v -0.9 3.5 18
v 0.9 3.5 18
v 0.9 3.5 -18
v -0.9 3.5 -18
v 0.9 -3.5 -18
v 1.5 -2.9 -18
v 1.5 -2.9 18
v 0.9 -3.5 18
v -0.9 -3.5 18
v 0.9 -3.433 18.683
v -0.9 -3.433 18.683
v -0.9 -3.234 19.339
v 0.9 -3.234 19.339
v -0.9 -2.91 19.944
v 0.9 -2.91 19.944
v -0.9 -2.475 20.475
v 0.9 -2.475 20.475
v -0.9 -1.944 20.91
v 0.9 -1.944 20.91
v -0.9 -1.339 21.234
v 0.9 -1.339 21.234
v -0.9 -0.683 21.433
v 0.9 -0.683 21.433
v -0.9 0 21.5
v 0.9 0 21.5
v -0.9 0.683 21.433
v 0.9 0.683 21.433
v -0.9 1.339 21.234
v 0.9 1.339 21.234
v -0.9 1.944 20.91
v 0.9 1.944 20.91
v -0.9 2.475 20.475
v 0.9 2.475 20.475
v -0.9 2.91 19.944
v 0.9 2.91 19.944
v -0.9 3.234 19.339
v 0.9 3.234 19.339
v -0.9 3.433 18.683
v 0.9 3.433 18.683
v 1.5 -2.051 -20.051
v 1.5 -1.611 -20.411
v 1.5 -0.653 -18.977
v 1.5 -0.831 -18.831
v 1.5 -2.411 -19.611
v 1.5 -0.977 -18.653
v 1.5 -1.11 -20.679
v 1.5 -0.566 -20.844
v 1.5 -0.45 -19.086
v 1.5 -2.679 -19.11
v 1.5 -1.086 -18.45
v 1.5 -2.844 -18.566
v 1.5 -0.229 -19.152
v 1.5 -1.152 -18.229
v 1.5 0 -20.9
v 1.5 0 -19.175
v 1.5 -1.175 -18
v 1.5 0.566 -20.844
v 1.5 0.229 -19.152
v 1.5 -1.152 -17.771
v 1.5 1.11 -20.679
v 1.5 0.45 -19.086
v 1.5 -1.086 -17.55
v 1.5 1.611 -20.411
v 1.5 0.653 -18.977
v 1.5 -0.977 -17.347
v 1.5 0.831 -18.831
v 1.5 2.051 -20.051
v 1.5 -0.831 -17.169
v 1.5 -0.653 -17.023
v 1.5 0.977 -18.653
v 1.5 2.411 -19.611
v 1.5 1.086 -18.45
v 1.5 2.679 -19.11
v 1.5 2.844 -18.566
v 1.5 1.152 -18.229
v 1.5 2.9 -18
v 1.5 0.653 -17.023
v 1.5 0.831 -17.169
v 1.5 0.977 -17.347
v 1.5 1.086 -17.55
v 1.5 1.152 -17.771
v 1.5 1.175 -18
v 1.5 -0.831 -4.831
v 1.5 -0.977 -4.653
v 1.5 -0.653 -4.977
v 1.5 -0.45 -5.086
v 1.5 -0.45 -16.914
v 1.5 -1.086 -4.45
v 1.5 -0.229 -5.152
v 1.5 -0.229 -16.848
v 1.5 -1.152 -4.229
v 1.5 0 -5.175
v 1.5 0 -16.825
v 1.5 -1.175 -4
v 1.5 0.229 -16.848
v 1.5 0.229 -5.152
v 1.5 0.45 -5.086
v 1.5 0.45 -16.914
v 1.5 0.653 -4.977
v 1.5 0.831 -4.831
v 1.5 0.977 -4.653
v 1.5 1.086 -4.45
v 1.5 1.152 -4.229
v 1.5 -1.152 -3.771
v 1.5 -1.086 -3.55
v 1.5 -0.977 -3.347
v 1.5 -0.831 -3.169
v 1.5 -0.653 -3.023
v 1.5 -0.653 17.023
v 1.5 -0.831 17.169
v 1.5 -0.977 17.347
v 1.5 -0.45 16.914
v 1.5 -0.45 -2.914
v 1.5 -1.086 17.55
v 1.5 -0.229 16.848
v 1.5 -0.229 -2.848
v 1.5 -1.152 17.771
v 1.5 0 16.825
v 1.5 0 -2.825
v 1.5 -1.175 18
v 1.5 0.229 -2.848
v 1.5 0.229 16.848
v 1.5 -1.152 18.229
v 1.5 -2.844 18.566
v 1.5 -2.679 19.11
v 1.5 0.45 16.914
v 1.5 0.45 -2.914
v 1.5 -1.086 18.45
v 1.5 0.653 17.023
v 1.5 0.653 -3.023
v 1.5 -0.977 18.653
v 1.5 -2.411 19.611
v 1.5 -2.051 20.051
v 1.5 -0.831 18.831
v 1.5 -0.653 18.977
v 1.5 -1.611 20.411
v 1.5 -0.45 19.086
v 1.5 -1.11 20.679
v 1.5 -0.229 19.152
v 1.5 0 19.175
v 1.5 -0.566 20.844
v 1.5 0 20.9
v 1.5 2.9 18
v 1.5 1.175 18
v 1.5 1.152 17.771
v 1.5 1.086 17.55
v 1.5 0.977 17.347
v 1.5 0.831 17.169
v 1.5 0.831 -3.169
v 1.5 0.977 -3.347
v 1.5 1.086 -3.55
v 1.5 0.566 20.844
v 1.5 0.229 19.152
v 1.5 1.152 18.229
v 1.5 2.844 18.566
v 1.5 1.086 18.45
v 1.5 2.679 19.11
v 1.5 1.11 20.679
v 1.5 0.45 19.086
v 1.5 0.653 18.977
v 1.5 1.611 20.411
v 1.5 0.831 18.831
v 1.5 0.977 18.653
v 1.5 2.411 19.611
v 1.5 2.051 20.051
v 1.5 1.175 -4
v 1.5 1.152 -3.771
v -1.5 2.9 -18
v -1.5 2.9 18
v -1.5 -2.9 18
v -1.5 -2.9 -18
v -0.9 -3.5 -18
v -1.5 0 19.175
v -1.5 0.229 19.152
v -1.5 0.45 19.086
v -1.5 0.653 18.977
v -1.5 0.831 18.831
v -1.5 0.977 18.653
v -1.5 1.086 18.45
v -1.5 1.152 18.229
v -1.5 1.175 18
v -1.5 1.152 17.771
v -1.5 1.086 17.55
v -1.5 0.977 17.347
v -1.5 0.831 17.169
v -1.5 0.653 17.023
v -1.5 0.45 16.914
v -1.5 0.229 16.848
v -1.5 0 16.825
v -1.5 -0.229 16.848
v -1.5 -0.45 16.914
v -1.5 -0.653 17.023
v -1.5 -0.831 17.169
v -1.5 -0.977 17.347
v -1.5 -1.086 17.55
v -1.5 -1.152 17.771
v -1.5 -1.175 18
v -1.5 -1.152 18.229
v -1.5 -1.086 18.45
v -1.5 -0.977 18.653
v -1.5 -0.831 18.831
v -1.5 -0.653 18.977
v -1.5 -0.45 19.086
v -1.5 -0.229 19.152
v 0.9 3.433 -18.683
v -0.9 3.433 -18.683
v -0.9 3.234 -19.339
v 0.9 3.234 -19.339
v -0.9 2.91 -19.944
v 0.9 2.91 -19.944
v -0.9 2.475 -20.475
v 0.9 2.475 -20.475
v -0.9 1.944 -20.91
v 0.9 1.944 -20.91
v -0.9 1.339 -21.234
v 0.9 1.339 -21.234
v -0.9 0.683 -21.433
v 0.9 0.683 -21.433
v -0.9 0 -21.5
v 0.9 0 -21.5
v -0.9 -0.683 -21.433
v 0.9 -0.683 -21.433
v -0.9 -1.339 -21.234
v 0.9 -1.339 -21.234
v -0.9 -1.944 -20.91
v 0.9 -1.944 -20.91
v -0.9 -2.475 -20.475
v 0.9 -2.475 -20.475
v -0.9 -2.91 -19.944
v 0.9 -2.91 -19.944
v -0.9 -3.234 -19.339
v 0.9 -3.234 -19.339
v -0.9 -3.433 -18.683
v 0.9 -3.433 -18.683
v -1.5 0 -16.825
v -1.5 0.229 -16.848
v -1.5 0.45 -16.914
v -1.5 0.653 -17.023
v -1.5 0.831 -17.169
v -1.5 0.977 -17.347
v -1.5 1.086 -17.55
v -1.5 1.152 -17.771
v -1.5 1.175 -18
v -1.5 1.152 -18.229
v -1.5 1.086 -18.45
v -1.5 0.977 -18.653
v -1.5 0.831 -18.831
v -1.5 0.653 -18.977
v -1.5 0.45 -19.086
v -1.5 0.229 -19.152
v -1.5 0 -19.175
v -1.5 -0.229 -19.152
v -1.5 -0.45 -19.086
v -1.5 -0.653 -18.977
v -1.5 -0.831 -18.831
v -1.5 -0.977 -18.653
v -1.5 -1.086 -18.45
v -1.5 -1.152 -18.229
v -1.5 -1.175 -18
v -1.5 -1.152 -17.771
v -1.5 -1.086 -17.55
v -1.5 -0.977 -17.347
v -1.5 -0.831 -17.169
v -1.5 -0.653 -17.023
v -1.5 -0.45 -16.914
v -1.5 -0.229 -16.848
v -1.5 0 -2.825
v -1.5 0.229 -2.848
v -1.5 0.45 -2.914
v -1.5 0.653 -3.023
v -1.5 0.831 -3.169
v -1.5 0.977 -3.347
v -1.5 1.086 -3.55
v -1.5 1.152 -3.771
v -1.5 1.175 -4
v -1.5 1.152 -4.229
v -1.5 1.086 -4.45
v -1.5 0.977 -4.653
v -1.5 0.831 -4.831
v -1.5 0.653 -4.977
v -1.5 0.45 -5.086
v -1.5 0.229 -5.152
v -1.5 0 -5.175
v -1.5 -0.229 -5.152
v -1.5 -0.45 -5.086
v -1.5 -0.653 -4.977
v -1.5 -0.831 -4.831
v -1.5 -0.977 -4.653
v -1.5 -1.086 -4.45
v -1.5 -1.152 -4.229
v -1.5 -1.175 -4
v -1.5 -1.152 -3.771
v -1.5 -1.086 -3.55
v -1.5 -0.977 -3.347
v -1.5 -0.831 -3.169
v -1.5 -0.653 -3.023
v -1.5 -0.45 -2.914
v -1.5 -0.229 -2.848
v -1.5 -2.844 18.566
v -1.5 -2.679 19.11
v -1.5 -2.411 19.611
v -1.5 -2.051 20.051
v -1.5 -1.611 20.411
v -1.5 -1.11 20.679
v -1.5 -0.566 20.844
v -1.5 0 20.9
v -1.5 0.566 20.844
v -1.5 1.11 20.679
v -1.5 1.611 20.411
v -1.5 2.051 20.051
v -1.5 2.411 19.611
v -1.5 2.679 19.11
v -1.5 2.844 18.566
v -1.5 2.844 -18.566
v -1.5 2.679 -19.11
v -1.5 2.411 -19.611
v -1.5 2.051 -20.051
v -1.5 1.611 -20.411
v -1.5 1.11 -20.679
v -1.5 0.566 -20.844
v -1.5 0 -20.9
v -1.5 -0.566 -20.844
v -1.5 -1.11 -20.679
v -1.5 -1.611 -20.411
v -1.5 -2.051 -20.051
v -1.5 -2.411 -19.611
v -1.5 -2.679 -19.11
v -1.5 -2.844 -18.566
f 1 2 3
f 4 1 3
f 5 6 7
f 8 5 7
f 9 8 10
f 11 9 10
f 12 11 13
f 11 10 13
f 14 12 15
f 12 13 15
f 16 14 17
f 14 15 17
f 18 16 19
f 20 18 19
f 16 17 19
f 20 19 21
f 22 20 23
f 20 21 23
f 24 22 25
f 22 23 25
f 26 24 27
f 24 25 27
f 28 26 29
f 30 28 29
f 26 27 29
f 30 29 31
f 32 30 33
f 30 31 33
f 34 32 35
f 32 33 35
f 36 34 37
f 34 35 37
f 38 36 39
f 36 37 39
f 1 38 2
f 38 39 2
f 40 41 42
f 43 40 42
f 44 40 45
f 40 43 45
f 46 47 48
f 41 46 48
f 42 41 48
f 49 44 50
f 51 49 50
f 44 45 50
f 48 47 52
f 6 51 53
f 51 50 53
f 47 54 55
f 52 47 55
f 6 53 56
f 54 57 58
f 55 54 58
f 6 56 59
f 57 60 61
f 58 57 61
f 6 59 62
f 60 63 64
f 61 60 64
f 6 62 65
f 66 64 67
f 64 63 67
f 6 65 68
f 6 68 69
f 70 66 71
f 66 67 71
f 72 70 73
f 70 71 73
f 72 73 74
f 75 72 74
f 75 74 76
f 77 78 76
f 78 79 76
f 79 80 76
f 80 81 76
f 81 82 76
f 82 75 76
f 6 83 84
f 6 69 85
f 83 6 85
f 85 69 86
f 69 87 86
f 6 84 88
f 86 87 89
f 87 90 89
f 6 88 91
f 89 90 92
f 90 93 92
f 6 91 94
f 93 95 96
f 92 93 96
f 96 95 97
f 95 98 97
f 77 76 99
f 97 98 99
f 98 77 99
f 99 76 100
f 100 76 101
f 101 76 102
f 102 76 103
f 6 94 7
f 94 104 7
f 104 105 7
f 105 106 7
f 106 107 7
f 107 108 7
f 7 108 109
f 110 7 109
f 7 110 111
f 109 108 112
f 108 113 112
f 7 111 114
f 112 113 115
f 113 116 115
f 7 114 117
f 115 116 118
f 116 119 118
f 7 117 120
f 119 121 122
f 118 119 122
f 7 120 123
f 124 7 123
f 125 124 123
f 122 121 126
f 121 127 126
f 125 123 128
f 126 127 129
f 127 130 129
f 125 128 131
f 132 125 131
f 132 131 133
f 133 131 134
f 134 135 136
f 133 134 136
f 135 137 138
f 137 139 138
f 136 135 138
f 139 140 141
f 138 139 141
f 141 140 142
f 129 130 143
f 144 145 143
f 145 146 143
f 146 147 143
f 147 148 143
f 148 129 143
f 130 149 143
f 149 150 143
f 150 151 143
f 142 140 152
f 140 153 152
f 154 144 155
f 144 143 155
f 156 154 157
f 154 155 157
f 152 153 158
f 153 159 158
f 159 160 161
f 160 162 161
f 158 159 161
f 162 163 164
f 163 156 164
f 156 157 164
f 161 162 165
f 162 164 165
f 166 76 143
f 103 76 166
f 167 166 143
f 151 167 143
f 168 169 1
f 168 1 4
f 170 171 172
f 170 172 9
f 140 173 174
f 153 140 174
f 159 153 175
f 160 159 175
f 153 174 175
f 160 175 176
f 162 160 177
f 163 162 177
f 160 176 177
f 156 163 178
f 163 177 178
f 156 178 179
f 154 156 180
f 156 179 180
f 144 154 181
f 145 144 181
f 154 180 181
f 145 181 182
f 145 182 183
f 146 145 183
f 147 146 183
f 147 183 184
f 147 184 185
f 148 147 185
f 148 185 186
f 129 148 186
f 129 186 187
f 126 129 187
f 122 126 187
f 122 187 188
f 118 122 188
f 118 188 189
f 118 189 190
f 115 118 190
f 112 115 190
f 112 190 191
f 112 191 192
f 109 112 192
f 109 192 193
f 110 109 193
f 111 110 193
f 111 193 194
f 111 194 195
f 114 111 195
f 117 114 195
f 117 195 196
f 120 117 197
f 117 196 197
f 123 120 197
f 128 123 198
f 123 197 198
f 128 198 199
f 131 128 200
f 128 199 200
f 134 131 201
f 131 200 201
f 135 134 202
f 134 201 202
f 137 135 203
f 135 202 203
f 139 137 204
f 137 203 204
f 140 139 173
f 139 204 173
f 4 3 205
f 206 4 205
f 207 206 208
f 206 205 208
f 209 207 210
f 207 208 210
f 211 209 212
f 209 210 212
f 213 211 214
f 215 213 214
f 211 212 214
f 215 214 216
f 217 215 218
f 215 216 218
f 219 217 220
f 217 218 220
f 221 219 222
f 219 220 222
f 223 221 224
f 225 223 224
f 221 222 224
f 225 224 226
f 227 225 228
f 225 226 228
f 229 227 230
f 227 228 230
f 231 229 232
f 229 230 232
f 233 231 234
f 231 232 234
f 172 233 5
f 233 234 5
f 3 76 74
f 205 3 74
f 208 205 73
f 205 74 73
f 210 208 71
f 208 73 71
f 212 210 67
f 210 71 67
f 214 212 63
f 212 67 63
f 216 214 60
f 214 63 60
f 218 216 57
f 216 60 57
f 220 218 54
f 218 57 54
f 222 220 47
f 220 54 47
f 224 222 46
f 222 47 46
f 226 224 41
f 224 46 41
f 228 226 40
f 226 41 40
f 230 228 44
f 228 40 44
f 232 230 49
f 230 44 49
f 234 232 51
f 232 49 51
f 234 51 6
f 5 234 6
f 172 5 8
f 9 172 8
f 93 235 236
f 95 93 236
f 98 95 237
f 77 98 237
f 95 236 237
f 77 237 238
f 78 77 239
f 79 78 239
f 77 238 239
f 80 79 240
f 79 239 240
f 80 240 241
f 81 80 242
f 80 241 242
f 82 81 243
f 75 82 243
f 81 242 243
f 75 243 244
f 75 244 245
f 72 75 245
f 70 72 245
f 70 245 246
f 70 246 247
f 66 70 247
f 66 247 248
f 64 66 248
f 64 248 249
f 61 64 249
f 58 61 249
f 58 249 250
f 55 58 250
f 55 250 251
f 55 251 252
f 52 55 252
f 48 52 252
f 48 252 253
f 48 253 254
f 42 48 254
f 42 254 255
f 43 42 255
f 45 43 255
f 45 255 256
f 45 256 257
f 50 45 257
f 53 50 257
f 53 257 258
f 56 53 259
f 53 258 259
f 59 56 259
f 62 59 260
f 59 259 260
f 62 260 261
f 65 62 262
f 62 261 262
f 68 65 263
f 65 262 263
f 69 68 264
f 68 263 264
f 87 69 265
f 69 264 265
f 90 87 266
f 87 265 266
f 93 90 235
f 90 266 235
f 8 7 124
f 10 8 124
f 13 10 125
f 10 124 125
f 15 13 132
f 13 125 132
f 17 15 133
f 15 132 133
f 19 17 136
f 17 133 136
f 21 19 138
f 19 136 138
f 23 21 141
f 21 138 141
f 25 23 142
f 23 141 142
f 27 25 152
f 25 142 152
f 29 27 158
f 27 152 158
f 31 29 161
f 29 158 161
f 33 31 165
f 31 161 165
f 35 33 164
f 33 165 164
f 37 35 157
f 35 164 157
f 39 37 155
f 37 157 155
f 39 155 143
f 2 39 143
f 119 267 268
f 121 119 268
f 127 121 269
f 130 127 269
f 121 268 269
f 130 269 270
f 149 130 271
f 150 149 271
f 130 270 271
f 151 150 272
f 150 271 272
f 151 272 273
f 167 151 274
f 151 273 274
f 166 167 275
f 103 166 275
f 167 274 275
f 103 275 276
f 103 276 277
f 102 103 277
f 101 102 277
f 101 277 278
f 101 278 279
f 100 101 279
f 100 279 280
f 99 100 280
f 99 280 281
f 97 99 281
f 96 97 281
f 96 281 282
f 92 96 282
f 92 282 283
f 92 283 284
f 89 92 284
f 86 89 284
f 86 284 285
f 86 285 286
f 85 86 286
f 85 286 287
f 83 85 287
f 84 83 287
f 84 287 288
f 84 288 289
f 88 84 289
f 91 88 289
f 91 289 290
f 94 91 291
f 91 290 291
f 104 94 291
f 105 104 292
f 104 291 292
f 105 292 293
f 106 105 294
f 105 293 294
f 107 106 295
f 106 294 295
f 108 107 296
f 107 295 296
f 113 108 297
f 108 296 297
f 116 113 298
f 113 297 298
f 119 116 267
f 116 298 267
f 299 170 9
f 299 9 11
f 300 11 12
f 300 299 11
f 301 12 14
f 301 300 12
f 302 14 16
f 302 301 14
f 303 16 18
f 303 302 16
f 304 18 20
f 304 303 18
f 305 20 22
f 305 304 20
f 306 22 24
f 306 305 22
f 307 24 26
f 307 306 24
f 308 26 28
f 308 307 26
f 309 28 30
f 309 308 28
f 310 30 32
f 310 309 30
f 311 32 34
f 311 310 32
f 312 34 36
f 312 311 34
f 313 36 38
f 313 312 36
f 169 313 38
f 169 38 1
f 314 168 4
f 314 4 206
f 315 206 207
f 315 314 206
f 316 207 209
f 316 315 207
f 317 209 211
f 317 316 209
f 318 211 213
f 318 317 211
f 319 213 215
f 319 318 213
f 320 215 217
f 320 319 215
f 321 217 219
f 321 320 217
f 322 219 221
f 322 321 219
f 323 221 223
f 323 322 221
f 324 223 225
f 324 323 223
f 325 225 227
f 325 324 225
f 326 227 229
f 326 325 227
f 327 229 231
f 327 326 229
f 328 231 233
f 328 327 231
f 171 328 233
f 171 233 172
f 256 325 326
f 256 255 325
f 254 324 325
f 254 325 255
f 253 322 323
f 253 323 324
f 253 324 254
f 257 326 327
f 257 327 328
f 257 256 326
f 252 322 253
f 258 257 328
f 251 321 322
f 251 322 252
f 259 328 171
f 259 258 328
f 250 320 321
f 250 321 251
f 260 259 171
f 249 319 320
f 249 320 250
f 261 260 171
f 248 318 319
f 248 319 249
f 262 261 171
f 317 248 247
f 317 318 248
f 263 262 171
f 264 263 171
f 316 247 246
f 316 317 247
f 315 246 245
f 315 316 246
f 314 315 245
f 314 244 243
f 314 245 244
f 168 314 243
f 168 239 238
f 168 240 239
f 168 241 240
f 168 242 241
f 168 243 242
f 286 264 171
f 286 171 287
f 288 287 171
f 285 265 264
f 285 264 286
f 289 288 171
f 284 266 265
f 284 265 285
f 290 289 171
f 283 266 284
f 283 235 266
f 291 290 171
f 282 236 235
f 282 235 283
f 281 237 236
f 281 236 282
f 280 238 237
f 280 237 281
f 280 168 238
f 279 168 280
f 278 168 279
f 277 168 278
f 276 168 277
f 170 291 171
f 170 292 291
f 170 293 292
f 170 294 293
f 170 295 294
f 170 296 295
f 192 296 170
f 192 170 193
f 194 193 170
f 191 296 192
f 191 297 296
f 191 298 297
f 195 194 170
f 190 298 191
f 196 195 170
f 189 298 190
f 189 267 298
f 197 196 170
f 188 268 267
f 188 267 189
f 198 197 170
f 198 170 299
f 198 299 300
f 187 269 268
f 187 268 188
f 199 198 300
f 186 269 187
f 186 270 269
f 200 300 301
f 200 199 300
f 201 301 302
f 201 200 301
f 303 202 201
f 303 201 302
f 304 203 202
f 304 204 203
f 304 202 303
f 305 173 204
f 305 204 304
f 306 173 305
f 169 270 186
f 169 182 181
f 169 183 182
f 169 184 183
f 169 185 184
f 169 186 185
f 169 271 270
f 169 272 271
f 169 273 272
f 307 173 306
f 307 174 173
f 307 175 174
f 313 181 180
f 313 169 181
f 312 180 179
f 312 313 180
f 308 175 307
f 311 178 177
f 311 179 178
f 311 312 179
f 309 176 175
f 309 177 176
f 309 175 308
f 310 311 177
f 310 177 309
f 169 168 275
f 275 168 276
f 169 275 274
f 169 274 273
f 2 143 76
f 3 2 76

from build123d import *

# Parameters (mm, degrees)
SKETCH_1_R               = 0.85
EXTRUDE_1_DEPTH          = 1.5
SKETCH_3_R               = 1.175
CUT_EXTRUDE_2_DEPTH      = 1
CUT_EXTRUDE_2_DEPTH_BACK = 4
CHAMFER_1_SIZE           = 0.6


with BuildPart() as part:
    # 草图1 → 凸台-拉伸1 (new body, symmetric)
    with BuildSketch(Plane(origin=(0, 0, 0), x_dir=(0, 0, -1), z_dir=(1, 0, 0))):
        with BuildLine():
            Line((-18, 3.5), (18, 3.5))
            ThreePointArc((18, 3.5), (21.5, 0), (18, -3.5))
            Line((18, -3.5), (-18, -3.5))
            ThreePointArc((-18, -3.5), (-21.5, 0), (-18, 3.5))
        make_face()
        with Locations((18, 0)):
            Circle(SKETCH_1_R, mode=Mode.SUBTRACT)
        with Locations((4, 0)):
            Circle(SKETCH_1_R, mode=Mode.SUBTRACT)
        with Locations((-18, 0)):
            Circle(SKETCH_1_R, mode=Mode.SUBTRACT)
    extrude(amount=EXTRUDE_1_DEPTH, both=True)

    # 草图3 → 切除-拉伸2 (cut, two sides)
    with BuildSketch(Plane.ZY.offset(1.5)) as cut_extrude_2_sk:
        with Locations((-18, 0)):
            Circle(SKETCH_3_R)
        with Locations((-4, 0)):
            Circle(SKETCH_3_R)
        with Locations((18, 0)):
            Circle(SKETCH_3_R)
    extrude(amount=CUT_EXTRUDE_2_DEPTH, mode=Mode.SUBTRACT)
    extrude(cut_extrude_2_sk.sketch, amount=-CUT_EXTRUDE_2_DEPTH_BACK, mode=Mode.SUBTRACT)

    # 倒角1
    chamfer_1_edges = [part.edges().sort_by_distance(p)[0] for p in [
        (1.5, 0, -21.5),
        (1.5, 3.5, 0),
        (1.5, 0, 21.5),
        (-1.5, 3.5, 0),
        (-1.5, 0, -21.5),
        (-1.5, -3.5, 0),
        (-1.5, 0, 21.5),
        (1.5, -3.5, 0),
    ]]
    chamfer(chamfer_1_edges, length=CHAMFER_1_SIZE)


solid = part.part
